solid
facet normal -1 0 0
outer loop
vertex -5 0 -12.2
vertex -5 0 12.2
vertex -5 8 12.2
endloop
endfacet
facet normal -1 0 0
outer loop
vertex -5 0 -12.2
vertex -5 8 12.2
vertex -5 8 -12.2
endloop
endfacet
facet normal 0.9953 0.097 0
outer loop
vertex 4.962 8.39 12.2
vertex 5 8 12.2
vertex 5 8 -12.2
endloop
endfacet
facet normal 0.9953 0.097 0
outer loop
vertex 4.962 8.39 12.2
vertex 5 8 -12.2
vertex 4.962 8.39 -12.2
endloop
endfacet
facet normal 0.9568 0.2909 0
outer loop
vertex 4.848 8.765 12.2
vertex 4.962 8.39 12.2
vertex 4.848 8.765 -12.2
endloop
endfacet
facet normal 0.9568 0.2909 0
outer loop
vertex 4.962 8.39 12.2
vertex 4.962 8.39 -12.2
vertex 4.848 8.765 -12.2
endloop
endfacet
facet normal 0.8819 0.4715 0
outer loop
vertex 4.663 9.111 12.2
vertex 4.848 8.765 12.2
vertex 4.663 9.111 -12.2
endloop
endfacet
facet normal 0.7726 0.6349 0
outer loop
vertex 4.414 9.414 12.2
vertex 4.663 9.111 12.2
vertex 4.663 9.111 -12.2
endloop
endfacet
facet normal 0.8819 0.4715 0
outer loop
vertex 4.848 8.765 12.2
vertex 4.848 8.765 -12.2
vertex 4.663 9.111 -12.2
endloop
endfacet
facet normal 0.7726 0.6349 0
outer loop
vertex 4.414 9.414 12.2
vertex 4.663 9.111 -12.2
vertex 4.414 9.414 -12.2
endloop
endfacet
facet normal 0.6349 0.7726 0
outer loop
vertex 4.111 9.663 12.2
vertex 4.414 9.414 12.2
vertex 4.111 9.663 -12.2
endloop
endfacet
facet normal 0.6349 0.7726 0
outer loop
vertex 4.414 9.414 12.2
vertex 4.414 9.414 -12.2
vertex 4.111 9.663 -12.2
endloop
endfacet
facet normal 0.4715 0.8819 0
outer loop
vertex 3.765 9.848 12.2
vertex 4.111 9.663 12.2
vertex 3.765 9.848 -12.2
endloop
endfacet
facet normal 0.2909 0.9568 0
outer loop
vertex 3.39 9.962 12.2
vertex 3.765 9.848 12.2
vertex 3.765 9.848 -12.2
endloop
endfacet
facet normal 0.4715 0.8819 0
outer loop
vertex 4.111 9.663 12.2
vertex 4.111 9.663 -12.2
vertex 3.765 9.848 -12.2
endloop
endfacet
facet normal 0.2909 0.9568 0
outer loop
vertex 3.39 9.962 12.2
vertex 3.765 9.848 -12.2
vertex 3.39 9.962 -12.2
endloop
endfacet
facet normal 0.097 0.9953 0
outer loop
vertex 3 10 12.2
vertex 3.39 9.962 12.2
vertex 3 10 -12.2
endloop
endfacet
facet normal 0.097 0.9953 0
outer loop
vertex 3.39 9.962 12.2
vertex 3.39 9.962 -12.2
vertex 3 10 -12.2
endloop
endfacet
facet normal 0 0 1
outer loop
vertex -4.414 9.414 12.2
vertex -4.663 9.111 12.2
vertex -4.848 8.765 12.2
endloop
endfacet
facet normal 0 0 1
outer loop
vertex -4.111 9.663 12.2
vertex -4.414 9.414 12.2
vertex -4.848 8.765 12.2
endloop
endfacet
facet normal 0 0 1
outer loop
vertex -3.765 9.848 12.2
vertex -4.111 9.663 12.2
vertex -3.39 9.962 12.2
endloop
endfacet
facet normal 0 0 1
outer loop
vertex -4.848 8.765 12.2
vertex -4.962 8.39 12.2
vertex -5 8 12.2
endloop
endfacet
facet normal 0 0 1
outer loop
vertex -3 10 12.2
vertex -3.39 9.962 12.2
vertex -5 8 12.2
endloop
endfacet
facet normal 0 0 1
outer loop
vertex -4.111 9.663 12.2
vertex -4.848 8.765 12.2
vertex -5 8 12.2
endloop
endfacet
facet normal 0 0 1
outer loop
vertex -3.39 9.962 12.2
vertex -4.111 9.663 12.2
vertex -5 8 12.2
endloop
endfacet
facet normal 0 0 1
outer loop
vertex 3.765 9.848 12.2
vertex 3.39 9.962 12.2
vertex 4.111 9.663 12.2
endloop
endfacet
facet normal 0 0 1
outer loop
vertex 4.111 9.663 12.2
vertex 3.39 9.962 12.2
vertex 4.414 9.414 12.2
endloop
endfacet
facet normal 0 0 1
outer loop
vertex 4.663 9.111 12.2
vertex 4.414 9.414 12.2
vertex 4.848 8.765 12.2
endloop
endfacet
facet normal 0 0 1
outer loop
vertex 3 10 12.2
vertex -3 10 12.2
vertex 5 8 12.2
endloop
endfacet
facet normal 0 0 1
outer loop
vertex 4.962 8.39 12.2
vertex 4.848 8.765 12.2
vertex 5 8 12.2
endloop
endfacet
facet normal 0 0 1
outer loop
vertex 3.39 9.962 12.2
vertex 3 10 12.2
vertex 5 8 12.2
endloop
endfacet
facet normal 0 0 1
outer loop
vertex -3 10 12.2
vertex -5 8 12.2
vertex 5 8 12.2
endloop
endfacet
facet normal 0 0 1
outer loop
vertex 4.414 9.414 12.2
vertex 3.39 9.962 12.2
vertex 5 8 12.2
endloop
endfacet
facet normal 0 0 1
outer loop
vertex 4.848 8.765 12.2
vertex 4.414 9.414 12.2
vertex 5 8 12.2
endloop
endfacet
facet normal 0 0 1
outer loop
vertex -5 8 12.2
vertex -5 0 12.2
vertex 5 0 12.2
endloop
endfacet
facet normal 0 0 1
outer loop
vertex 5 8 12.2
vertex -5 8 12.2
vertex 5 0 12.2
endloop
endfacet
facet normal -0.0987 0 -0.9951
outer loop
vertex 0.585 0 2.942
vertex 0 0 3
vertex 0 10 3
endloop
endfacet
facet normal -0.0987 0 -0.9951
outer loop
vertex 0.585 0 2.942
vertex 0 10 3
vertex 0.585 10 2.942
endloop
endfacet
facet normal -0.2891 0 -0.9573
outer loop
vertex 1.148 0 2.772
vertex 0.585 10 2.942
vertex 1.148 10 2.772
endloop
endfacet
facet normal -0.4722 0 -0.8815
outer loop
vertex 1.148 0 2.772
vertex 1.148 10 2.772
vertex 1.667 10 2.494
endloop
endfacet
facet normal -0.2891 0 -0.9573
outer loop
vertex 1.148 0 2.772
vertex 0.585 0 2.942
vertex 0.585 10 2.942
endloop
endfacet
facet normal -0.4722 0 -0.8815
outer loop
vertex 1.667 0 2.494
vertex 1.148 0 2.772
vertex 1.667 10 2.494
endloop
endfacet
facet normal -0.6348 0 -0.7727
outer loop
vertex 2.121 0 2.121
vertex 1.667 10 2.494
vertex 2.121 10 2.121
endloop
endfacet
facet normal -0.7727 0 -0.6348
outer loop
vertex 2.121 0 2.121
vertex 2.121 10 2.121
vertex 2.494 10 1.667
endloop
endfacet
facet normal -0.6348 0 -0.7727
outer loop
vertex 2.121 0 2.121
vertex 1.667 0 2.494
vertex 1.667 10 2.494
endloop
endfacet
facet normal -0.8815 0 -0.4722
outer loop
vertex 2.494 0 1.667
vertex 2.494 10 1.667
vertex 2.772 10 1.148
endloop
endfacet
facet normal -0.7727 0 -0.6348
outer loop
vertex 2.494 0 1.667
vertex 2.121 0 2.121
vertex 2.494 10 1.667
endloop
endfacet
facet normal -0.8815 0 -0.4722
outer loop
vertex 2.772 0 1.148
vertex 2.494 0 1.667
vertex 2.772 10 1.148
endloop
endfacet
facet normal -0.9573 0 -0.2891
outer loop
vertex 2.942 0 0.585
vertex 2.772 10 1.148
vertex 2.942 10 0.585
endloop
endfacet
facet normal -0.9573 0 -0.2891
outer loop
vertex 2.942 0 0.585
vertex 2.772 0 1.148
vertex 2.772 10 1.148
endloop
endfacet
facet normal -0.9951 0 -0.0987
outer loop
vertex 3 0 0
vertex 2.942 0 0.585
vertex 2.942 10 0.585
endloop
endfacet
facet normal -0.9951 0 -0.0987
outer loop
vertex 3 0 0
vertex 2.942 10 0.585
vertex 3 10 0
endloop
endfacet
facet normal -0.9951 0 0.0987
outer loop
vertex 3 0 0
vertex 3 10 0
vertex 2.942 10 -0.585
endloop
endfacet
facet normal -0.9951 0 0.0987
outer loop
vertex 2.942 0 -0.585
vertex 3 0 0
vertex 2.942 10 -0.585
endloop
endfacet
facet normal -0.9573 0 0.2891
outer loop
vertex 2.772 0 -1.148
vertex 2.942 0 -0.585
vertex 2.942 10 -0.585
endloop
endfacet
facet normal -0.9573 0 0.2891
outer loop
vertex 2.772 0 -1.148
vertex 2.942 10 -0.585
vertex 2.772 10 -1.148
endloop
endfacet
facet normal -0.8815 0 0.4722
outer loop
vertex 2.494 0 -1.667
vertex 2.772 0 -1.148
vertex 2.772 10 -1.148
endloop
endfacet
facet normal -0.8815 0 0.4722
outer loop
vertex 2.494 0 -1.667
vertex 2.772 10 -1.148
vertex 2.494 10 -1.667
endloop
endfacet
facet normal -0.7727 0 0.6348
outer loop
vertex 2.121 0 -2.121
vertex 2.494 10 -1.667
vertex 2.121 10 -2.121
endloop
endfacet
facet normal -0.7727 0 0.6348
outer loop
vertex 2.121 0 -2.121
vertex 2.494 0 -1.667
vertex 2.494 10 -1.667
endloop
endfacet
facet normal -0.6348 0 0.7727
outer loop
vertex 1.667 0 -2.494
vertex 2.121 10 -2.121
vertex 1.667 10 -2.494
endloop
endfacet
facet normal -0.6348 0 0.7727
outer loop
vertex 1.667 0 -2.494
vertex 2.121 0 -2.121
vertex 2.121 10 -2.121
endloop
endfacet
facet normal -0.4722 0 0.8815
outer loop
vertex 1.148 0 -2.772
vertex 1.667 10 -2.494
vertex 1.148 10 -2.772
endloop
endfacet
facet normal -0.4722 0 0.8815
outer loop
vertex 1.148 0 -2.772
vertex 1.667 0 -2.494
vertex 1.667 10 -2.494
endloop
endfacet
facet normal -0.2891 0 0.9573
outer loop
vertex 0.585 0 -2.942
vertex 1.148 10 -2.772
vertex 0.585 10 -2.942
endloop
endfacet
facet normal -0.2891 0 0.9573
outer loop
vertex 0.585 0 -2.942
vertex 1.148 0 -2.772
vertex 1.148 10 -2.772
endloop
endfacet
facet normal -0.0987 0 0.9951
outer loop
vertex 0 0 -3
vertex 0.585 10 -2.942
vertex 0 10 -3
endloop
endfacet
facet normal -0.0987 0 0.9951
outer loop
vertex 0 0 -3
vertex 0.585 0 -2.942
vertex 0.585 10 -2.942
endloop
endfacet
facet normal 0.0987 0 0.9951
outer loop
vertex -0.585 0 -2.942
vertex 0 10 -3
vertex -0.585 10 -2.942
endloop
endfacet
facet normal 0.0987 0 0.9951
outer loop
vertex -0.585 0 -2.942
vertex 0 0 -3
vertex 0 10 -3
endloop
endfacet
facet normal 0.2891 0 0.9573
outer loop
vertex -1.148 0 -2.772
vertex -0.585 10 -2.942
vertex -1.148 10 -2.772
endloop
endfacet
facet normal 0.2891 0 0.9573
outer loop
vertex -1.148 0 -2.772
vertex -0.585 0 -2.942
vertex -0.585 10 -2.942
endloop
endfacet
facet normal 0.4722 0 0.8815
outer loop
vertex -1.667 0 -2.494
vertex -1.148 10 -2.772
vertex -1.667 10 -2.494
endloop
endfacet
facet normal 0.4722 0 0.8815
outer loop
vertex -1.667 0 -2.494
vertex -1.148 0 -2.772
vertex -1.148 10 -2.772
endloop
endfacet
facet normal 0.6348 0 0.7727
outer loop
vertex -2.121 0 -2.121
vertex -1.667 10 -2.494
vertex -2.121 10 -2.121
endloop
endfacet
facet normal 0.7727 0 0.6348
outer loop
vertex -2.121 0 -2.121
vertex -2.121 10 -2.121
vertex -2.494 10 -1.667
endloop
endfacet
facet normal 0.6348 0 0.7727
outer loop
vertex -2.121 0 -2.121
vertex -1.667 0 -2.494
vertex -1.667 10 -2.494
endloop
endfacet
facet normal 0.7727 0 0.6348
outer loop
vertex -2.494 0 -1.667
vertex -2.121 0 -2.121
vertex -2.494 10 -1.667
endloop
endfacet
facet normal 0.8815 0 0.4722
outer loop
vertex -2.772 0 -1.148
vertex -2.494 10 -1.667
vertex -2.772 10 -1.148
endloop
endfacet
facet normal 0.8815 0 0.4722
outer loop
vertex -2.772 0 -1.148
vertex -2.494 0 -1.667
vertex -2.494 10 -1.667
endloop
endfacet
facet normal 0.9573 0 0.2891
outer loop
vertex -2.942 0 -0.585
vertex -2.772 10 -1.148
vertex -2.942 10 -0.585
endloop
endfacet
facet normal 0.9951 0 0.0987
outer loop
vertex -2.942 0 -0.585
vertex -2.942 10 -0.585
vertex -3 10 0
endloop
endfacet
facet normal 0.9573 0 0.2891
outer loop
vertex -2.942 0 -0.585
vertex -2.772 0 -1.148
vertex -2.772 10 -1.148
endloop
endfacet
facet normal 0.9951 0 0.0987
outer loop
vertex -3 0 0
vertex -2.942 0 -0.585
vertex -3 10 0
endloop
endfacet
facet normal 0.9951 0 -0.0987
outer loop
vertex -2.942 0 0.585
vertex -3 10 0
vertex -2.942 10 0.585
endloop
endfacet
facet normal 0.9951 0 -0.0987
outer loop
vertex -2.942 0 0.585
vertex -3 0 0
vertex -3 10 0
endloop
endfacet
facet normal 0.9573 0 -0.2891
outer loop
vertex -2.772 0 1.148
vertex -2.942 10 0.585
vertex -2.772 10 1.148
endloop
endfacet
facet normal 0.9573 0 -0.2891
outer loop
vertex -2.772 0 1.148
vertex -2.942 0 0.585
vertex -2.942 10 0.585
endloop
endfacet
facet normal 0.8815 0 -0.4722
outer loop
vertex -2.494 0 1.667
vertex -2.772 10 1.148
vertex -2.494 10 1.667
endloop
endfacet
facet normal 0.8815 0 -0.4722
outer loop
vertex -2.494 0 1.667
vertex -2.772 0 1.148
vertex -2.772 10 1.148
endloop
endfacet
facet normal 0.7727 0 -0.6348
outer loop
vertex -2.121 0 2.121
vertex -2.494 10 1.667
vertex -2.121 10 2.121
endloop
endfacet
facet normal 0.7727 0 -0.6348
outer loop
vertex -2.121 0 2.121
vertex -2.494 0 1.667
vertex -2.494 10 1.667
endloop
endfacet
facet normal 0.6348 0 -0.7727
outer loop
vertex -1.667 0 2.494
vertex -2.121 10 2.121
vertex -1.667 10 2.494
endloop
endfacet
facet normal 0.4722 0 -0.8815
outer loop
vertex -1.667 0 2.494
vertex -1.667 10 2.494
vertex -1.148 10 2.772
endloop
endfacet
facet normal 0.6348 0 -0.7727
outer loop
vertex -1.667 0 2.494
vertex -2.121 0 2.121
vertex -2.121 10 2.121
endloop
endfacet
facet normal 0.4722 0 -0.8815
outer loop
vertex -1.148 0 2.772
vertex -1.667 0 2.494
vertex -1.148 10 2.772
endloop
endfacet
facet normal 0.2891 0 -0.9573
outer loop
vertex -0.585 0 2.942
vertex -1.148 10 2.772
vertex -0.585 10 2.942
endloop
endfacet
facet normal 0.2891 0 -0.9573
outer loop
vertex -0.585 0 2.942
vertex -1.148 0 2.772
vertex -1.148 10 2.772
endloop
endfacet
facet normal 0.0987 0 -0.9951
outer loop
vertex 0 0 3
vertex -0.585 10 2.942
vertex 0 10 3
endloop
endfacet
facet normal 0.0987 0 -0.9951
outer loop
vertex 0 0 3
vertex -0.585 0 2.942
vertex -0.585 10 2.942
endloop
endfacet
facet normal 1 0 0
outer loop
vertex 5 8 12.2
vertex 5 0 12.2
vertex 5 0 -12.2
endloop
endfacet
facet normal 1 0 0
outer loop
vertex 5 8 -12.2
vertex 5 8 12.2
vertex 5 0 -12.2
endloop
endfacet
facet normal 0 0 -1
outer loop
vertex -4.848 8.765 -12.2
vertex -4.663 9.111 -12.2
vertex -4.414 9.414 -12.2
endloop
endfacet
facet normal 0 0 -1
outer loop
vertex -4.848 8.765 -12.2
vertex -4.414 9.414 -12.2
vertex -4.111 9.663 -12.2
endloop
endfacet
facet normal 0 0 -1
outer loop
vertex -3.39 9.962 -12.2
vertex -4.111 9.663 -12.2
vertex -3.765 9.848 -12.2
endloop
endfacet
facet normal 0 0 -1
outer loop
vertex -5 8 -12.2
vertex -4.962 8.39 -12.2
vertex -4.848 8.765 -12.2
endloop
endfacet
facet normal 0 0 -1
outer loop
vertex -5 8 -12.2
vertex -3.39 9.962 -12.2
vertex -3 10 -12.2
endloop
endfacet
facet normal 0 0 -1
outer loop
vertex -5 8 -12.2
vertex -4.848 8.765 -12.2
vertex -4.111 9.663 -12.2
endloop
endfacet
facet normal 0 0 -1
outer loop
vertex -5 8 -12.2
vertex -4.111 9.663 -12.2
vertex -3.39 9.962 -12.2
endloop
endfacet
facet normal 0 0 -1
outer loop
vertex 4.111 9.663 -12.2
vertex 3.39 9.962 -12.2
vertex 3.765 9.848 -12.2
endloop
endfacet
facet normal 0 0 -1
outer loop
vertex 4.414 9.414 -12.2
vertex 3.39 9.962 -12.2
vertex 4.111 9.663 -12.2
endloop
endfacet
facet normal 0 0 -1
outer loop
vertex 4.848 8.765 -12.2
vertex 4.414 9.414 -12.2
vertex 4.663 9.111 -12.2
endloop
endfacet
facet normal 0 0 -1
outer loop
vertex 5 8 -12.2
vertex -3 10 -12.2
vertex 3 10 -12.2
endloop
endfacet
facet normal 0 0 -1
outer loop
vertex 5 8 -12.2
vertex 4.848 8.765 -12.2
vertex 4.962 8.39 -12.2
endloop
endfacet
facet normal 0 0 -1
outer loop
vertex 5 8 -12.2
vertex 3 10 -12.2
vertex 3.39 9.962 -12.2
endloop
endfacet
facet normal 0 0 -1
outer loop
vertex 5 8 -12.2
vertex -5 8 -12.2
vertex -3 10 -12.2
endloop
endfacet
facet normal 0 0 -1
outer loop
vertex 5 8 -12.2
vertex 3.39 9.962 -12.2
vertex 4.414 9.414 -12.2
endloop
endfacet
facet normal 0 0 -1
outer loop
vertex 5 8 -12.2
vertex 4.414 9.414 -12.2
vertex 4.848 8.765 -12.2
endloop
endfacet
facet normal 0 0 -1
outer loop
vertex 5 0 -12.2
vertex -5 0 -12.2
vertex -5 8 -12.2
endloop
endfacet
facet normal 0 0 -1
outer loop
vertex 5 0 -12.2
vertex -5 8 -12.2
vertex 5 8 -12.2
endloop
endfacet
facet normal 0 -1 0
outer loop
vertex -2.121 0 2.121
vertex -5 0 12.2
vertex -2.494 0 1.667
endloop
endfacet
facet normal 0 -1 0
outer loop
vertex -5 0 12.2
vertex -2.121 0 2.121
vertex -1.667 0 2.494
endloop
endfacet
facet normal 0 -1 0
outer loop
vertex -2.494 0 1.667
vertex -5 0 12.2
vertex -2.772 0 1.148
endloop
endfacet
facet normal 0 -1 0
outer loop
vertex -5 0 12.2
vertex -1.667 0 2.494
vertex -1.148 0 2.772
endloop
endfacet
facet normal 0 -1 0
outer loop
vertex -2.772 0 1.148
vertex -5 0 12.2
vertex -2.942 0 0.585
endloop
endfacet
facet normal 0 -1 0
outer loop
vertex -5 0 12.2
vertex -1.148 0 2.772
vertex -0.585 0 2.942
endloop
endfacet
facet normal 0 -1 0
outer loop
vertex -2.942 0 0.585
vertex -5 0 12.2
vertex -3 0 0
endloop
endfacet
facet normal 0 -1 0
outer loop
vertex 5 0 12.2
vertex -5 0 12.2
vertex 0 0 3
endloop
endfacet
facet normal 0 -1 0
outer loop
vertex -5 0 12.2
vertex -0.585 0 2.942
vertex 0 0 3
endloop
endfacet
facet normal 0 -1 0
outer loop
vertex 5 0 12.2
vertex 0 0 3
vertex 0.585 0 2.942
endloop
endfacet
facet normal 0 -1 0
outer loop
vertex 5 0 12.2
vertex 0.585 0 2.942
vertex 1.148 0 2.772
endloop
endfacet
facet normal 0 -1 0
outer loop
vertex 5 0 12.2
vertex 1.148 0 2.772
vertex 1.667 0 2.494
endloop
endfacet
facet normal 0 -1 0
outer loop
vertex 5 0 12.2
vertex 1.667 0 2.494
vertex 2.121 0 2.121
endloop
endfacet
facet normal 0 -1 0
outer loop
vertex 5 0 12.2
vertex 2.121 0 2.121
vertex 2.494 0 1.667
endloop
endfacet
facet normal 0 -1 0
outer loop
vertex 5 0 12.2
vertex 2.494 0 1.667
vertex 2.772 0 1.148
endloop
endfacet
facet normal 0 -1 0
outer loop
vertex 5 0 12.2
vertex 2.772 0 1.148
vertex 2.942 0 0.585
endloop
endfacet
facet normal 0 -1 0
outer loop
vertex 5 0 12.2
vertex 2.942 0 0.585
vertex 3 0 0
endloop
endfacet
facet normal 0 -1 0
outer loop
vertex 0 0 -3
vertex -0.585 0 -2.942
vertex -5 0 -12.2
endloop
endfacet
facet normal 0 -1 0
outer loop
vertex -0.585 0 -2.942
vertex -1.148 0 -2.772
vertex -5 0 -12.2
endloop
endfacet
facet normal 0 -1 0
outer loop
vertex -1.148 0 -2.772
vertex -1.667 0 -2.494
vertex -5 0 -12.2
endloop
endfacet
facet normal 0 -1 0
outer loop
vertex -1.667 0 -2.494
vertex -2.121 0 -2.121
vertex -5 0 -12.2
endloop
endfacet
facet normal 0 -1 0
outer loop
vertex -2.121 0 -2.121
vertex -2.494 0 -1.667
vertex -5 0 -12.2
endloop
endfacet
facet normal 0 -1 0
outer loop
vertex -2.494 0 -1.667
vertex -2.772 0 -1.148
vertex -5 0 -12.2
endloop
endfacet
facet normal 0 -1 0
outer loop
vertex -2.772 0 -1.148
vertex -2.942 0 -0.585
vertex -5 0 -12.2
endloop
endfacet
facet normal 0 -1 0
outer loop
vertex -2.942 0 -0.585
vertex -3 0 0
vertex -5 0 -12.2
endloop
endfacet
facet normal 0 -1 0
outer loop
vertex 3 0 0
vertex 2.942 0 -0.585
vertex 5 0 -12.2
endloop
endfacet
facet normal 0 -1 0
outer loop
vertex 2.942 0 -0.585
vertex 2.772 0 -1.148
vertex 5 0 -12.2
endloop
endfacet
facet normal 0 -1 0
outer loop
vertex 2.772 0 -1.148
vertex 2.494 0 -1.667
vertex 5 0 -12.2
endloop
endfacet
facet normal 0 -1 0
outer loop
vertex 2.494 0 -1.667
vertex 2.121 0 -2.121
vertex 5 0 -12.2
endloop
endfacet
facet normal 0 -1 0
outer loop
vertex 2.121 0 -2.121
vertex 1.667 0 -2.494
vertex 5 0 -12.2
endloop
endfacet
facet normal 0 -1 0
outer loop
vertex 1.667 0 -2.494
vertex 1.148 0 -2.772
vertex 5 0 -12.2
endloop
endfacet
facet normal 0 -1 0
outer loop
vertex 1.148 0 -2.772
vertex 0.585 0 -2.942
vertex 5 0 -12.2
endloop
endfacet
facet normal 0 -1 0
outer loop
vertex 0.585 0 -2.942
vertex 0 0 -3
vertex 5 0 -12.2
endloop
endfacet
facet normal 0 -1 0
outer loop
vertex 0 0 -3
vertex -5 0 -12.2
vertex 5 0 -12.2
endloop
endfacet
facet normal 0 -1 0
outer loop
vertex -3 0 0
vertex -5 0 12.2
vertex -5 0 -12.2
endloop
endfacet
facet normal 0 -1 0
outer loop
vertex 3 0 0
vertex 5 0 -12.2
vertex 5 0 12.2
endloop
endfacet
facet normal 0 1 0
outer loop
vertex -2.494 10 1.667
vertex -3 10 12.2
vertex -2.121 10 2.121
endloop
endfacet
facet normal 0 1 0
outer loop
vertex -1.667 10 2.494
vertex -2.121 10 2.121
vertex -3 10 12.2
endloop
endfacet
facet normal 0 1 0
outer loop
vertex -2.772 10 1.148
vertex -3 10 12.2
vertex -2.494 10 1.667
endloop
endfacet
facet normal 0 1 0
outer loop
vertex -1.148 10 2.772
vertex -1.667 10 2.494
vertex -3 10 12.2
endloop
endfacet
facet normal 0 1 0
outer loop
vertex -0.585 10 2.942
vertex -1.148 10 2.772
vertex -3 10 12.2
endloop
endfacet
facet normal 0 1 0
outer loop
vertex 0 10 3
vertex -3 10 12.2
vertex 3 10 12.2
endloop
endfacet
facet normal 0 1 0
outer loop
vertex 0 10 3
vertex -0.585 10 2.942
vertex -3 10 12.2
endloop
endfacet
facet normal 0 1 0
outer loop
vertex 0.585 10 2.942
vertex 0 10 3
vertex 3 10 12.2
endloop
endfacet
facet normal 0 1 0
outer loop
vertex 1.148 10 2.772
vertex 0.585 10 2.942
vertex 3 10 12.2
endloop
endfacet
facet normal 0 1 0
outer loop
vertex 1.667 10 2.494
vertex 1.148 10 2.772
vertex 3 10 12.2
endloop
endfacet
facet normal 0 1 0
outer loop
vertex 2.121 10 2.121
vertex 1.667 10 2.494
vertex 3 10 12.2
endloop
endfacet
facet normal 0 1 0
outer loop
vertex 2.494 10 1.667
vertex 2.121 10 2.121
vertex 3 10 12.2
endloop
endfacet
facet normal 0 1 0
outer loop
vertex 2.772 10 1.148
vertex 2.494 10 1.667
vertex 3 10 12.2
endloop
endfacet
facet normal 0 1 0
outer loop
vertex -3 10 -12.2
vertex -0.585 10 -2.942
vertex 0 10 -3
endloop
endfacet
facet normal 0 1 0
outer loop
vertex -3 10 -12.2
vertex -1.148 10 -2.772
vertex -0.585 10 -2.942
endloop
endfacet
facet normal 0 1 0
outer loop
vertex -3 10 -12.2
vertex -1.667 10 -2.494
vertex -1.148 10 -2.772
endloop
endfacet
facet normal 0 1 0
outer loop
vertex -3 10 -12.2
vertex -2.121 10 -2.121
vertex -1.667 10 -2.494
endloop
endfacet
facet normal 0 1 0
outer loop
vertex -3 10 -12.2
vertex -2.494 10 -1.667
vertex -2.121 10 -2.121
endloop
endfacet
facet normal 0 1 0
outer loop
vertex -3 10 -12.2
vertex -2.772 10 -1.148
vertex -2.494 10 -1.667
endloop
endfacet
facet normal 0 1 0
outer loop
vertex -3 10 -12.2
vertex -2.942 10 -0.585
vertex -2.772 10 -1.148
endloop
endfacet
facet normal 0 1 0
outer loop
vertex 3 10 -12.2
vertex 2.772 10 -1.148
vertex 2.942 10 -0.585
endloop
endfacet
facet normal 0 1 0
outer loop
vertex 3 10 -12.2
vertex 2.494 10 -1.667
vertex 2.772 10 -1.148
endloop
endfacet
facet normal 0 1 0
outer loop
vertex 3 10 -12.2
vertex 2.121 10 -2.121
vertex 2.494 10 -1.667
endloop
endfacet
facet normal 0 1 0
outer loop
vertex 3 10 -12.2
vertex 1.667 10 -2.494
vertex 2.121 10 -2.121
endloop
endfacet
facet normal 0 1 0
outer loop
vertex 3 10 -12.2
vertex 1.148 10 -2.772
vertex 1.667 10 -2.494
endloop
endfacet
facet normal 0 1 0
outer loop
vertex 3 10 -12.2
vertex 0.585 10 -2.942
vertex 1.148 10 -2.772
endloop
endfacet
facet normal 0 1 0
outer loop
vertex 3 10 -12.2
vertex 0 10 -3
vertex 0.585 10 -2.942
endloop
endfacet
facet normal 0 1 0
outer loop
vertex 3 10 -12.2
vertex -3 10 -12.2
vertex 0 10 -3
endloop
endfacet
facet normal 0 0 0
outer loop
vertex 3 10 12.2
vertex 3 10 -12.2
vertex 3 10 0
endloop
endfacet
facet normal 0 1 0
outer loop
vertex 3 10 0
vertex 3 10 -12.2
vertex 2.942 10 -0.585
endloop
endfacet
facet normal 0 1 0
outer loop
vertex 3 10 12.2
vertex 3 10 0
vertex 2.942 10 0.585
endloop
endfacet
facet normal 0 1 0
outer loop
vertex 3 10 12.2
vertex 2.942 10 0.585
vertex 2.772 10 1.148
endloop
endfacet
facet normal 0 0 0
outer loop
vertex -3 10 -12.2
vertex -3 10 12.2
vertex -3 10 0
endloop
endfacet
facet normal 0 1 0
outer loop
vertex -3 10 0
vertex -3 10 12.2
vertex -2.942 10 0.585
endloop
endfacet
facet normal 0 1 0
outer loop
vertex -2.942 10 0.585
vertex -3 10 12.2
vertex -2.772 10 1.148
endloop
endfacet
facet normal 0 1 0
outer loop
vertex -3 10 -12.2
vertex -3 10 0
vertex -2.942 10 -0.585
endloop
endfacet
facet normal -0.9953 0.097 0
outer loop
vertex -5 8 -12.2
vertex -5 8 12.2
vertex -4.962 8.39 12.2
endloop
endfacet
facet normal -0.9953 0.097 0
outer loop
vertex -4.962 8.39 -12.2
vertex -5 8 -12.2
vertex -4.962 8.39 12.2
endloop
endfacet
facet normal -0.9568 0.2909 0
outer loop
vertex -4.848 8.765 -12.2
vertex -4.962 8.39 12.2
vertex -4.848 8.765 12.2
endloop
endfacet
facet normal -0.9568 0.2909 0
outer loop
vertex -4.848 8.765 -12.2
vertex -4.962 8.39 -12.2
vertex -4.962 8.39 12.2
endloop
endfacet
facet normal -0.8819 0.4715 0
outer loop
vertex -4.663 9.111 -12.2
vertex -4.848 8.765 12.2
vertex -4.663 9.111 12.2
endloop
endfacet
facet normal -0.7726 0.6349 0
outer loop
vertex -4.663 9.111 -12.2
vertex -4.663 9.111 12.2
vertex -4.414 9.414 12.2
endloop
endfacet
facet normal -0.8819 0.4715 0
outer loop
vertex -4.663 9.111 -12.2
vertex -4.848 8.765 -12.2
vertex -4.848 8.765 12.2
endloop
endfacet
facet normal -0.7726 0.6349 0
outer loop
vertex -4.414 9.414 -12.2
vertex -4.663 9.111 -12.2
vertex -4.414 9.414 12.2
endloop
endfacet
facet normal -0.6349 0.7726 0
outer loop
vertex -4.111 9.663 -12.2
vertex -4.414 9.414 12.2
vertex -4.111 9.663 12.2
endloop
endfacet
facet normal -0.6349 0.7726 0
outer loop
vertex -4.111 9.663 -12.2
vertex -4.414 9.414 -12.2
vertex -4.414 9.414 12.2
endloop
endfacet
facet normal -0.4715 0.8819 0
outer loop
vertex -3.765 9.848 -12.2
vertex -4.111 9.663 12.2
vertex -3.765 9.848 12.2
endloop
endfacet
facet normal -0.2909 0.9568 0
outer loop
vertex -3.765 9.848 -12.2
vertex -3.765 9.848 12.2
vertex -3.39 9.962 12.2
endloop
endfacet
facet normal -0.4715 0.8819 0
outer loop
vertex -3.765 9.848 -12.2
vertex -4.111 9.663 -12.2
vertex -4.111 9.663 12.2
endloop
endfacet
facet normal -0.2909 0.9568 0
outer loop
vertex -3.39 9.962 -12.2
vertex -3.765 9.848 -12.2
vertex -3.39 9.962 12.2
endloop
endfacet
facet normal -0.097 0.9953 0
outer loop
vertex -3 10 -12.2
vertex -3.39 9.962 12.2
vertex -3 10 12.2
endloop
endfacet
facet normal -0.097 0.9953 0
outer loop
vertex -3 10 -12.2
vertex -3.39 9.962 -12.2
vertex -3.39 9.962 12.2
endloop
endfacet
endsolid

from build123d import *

# Parameters (mm, degrees)
SKETCH1_W           = 10
SKETCH1_H           = 24.4
SKETCH1_R           = 3
BOSS_EXTRUDE1_DEPTH = 10
FILLET1_R           = 2


with BuildPart() as part:
    # Sketch1 → Boss-Extrude1 (new body)
    with BuildSketch(Plane(origin=(0, 0, 0), x_dir=(1, 0, 0), z_dir=(0, 1, 0))):
        Rectangle(SKETCH1_W, SKETCH1_H)
        with Locations(Location((0, 0, 0), (0, 0, 270))):
            Circle(SKETCH1_R, mode=Mode.SUBTRACT)
    extrude(amount=BOSS_EXTRUDE1_DEPTH)

    # Fillet1
    fillet1_edges = [part.edges().sort_by_distance(p)[0] for p in [
        (-5, 10, 0),
        (5, 10, 0),
    ]]
    fillet(fillet1_edges, radius=FILLET1_R - 0.0001)  # a hair under: the kernel refuses the full size


solid = part.part
